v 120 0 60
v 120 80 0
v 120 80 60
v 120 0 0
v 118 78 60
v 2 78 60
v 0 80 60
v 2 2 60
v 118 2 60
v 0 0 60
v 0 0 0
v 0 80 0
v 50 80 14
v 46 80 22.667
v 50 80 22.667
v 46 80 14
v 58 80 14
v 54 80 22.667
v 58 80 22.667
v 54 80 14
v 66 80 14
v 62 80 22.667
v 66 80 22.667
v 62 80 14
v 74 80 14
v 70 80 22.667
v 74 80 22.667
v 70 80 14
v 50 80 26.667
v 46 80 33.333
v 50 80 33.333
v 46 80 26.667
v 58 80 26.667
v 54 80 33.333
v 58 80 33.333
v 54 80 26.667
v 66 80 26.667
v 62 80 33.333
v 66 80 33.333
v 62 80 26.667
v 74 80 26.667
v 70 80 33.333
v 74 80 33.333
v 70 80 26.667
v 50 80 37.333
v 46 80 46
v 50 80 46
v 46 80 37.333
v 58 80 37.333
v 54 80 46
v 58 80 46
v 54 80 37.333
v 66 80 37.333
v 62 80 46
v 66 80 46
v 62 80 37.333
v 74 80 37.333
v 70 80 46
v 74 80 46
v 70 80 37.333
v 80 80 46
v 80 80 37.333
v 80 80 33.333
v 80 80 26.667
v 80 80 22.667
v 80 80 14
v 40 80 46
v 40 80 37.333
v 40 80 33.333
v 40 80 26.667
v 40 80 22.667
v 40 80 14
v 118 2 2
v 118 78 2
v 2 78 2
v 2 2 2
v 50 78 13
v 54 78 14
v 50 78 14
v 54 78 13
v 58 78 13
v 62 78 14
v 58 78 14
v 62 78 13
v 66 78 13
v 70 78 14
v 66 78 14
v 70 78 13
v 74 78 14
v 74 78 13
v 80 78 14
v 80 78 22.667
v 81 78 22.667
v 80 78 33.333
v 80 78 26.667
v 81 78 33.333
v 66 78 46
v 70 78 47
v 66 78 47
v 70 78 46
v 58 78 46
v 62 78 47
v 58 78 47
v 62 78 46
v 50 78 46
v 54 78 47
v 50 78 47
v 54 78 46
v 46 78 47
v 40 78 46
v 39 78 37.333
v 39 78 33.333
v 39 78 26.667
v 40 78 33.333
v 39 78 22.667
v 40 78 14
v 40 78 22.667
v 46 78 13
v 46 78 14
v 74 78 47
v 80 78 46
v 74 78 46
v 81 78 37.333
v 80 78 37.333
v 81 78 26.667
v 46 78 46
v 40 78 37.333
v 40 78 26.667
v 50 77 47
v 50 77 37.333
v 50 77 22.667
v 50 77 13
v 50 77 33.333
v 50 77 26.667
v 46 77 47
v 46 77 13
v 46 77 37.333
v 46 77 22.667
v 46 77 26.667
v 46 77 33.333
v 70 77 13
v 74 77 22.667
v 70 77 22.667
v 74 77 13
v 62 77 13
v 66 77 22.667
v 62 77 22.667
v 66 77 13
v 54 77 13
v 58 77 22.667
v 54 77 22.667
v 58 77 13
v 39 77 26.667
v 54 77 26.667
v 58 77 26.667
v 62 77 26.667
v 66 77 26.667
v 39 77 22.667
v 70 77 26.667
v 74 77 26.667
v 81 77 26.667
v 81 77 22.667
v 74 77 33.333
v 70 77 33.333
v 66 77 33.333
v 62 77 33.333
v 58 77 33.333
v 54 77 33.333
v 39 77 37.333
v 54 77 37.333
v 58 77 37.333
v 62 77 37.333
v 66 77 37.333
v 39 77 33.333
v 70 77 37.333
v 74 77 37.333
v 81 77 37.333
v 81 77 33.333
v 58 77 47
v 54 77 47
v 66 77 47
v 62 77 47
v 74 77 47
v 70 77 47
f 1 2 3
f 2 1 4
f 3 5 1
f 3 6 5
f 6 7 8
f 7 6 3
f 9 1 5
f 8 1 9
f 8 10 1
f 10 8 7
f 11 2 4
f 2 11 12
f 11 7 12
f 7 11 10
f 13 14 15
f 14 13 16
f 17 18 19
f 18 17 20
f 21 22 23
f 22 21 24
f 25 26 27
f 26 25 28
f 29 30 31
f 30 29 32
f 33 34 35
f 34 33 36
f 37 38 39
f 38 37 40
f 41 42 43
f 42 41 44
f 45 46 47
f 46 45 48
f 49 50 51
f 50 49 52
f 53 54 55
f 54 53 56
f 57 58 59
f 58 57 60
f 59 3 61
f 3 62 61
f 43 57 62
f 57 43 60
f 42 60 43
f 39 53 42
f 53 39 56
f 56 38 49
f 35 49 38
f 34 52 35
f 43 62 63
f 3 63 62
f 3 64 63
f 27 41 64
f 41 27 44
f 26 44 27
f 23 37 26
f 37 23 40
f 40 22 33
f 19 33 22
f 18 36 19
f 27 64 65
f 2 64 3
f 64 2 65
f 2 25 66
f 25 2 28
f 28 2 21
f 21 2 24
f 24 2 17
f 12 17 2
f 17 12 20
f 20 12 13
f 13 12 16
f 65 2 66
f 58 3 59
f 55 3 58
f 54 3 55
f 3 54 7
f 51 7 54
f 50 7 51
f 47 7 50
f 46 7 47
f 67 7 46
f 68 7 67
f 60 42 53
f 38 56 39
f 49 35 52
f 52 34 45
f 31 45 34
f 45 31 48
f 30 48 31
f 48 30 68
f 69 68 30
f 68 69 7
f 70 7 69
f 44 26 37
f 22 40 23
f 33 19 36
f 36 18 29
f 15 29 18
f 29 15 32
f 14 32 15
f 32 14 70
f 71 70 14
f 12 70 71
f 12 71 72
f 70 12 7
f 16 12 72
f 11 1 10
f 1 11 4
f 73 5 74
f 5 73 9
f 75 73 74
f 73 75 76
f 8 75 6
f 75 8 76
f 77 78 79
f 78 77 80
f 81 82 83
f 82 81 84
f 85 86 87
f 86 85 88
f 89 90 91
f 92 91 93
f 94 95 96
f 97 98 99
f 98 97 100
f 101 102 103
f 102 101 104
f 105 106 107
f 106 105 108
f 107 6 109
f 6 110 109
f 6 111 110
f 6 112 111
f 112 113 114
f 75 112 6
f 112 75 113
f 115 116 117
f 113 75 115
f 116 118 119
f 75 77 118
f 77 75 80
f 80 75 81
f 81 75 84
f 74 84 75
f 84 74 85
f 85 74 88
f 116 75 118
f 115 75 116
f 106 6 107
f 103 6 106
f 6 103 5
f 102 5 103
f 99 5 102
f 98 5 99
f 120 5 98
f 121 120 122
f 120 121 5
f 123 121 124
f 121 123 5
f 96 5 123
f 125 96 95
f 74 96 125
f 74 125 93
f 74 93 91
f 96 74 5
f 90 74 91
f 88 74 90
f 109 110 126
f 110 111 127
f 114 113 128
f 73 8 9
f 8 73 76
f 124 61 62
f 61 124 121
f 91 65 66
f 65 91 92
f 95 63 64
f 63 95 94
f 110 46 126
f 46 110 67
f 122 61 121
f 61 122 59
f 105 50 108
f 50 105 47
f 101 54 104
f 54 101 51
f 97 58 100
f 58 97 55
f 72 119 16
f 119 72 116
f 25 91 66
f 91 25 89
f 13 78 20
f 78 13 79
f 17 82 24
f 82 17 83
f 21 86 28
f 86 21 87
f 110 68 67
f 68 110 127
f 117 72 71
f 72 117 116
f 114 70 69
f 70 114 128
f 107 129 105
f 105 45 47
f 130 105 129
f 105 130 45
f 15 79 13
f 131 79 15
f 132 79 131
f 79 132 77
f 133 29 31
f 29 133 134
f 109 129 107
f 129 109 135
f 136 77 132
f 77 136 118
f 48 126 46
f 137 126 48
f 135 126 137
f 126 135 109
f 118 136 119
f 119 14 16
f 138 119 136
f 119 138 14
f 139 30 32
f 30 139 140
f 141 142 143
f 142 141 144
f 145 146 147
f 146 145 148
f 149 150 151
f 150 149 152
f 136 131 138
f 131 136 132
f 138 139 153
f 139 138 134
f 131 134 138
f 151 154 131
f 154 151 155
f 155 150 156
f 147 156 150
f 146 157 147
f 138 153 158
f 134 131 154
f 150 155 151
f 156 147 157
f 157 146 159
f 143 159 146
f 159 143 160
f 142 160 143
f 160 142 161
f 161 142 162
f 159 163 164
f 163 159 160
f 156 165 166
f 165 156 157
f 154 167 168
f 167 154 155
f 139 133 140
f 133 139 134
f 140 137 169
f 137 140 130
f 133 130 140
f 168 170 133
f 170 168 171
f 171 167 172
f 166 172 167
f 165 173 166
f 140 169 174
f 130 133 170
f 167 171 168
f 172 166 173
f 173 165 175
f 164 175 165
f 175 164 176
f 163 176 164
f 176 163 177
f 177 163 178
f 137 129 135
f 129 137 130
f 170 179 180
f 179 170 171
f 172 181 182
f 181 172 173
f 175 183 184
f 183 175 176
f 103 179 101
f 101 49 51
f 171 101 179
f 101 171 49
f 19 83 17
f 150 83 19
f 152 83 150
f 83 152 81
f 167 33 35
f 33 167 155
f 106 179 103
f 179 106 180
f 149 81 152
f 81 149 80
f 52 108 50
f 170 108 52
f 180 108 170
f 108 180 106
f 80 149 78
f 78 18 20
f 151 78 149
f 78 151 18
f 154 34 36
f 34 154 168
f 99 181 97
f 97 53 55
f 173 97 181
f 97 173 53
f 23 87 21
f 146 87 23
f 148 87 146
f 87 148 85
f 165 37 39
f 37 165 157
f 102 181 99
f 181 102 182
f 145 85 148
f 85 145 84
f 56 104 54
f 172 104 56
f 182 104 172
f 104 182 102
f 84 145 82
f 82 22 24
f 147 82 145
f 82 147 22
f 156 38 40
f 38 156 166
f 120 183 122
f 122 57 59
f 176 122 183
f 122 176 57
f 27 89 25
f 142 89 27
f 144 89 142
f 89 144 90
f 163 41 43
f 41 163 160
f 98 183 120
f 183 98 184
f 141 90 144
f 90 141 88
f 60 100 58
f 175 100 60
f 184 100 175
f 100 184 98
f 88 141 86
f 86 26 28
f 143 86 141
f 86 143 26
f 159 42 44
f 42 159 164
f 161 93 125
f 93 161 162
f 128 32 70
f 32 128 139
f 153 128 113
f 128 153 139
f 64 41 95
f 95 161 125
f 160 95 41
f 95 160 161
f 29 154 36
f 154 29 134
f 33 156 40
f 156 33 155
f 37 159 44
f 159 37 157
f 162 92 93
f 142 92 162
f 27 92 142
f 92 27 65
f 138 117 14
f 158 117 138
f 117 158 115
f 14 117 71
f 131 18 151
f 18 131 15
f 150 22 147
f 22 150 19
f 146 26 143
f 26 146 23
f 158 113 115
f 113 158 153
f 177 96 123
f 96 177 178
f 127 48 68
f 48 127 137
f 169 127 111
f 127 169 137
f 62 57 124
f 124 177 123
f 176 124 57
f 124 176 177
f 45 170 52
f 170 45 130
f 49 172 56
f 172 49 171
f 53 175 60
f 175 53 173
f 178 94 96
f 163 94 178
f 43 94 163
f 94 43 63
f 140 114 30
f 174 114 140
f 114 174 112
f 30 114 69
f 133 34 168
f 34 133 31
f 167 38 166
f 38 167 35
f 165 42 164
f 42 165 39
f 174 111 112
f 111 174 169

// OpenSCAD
$fn = 32;

// ----------------------------------------------------------------------
// Vent box: crossgrid enclosure
// ----------------------------------------------------------------------

// --- parameters (mm) ---
box_l = 120;              // box length, X
box_w = 80;               // box width, Y
box_h = 60;               // box height, Z
wall_t = 2;               // shell wall thickness
win_l = 40;               // vent window width, X
win_h = 32;               // vent window height, Z
bar_w = 4;                // grid bar width
n_v = 4;                  // vertical bar count
n_h = 2;                  // horizontal bar count

win_z0 = (box_h - win_h) / 2;  // window lower edge Z
v_step = win_l / (n_v + 1);  // vertical bar step
h_step = win_h / (n_h + 1);  // horizontal bar step

difference() {
  union() {
    difference() {
      cube([box_l, box_w, box_h]);
  translate([wall_t, wall_t, wall_t])
    cube([box_l - 2 * wall_t, box_w - 2 * wall_t, box_h]);
  translate([(box_l - win_l) / 2, box_w - wall_t - 1, win_z0])
    cube([win_l, wall_t + 2, win_h]);
    }
    for (i = [1 : n_v])
      translate([(box_l - win_l) / 2 + i * v_step - bar_w / 2,
                 box_w - wall_t - 1, win_z0 - 1])
        cube([bar_w, wall_t + 1, win_h + 2]);
    for (i = [1 : n_h])
      translate([(box_l - win_l) / 2 - 1, box_w - wall_t - 1,
                 win_z0 + i * h_step - bar_w / 2])
        cube([win_l + 2, wall_t + 1, bar_w]);
  }
}
